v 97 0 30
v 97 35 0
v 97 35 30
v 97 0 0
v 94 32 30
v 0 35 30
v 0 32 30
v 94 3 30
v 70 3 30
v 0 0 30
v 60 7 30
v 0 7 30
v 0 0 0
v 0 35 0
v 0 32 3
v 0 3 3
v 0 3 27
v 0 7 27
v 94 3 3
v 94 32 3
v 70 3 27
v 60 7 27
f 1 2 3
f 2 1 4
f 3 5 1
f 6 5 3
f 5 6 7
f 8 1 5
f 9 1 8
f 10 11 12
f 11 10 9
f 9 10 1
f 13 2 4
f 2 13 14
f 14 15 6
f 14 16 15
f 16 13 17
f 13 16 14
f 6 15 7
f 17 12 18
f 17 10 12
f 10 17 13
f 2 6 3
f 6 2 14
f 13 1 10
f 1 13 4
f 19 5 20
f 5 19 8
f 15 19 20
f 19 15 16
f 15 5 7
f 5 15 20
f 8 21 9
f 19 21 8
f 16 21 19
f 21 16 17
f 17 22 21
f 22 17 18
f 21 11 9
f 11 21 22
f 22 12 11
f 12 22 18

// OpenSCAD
/* [General Dimensions] */
INNER_LENGTH = 94;
INNER_WIDTH = 29;
INNER_HEIGHT = 24;
WALL_THICKNESS = 3;

/* [Holder Lip Dimensions] */
HOLDER_LIP_LENGTH = 60;
HOLDER_LIP_WIDTH = 4;
HOLDER_LIP_INCLINE_LENGTH = 10;

render() {
  union() {
    difference() {
      cube([INNER_LENGTH + WALL_THICKNESS, INNER_WIDTH + 2 * WALL_THICKNESS, INNER_HEIGHT + 2 * WALL_THICKNESS]);
      translate([0, WALL_THICKNESS, WALL_THICKNESS]) {
        cube([INNER_LENGTH, INNER_WIDTH, INNER_HEIGHT + WALL_THICKNESS]);
      }
    }
    translate([0, WALL_THICKNESS, WALL_THICKNESS + INNER_HEIGHT]) {
      hull() {
        cube([HOLDER_LIP_LENGTH, HOLDER_LIP_WIDTH, WALL_THICKNESS]);
        translate([HOLDER_LIP_LENGTH + HOLDER_LIP_INCLINE_LENGTH, 0, 0]) {
          cube([0.000000000000000000001, 0.000000000000000000001, WALL_THICKNESS]);
        }
      }
    }
  }
}
